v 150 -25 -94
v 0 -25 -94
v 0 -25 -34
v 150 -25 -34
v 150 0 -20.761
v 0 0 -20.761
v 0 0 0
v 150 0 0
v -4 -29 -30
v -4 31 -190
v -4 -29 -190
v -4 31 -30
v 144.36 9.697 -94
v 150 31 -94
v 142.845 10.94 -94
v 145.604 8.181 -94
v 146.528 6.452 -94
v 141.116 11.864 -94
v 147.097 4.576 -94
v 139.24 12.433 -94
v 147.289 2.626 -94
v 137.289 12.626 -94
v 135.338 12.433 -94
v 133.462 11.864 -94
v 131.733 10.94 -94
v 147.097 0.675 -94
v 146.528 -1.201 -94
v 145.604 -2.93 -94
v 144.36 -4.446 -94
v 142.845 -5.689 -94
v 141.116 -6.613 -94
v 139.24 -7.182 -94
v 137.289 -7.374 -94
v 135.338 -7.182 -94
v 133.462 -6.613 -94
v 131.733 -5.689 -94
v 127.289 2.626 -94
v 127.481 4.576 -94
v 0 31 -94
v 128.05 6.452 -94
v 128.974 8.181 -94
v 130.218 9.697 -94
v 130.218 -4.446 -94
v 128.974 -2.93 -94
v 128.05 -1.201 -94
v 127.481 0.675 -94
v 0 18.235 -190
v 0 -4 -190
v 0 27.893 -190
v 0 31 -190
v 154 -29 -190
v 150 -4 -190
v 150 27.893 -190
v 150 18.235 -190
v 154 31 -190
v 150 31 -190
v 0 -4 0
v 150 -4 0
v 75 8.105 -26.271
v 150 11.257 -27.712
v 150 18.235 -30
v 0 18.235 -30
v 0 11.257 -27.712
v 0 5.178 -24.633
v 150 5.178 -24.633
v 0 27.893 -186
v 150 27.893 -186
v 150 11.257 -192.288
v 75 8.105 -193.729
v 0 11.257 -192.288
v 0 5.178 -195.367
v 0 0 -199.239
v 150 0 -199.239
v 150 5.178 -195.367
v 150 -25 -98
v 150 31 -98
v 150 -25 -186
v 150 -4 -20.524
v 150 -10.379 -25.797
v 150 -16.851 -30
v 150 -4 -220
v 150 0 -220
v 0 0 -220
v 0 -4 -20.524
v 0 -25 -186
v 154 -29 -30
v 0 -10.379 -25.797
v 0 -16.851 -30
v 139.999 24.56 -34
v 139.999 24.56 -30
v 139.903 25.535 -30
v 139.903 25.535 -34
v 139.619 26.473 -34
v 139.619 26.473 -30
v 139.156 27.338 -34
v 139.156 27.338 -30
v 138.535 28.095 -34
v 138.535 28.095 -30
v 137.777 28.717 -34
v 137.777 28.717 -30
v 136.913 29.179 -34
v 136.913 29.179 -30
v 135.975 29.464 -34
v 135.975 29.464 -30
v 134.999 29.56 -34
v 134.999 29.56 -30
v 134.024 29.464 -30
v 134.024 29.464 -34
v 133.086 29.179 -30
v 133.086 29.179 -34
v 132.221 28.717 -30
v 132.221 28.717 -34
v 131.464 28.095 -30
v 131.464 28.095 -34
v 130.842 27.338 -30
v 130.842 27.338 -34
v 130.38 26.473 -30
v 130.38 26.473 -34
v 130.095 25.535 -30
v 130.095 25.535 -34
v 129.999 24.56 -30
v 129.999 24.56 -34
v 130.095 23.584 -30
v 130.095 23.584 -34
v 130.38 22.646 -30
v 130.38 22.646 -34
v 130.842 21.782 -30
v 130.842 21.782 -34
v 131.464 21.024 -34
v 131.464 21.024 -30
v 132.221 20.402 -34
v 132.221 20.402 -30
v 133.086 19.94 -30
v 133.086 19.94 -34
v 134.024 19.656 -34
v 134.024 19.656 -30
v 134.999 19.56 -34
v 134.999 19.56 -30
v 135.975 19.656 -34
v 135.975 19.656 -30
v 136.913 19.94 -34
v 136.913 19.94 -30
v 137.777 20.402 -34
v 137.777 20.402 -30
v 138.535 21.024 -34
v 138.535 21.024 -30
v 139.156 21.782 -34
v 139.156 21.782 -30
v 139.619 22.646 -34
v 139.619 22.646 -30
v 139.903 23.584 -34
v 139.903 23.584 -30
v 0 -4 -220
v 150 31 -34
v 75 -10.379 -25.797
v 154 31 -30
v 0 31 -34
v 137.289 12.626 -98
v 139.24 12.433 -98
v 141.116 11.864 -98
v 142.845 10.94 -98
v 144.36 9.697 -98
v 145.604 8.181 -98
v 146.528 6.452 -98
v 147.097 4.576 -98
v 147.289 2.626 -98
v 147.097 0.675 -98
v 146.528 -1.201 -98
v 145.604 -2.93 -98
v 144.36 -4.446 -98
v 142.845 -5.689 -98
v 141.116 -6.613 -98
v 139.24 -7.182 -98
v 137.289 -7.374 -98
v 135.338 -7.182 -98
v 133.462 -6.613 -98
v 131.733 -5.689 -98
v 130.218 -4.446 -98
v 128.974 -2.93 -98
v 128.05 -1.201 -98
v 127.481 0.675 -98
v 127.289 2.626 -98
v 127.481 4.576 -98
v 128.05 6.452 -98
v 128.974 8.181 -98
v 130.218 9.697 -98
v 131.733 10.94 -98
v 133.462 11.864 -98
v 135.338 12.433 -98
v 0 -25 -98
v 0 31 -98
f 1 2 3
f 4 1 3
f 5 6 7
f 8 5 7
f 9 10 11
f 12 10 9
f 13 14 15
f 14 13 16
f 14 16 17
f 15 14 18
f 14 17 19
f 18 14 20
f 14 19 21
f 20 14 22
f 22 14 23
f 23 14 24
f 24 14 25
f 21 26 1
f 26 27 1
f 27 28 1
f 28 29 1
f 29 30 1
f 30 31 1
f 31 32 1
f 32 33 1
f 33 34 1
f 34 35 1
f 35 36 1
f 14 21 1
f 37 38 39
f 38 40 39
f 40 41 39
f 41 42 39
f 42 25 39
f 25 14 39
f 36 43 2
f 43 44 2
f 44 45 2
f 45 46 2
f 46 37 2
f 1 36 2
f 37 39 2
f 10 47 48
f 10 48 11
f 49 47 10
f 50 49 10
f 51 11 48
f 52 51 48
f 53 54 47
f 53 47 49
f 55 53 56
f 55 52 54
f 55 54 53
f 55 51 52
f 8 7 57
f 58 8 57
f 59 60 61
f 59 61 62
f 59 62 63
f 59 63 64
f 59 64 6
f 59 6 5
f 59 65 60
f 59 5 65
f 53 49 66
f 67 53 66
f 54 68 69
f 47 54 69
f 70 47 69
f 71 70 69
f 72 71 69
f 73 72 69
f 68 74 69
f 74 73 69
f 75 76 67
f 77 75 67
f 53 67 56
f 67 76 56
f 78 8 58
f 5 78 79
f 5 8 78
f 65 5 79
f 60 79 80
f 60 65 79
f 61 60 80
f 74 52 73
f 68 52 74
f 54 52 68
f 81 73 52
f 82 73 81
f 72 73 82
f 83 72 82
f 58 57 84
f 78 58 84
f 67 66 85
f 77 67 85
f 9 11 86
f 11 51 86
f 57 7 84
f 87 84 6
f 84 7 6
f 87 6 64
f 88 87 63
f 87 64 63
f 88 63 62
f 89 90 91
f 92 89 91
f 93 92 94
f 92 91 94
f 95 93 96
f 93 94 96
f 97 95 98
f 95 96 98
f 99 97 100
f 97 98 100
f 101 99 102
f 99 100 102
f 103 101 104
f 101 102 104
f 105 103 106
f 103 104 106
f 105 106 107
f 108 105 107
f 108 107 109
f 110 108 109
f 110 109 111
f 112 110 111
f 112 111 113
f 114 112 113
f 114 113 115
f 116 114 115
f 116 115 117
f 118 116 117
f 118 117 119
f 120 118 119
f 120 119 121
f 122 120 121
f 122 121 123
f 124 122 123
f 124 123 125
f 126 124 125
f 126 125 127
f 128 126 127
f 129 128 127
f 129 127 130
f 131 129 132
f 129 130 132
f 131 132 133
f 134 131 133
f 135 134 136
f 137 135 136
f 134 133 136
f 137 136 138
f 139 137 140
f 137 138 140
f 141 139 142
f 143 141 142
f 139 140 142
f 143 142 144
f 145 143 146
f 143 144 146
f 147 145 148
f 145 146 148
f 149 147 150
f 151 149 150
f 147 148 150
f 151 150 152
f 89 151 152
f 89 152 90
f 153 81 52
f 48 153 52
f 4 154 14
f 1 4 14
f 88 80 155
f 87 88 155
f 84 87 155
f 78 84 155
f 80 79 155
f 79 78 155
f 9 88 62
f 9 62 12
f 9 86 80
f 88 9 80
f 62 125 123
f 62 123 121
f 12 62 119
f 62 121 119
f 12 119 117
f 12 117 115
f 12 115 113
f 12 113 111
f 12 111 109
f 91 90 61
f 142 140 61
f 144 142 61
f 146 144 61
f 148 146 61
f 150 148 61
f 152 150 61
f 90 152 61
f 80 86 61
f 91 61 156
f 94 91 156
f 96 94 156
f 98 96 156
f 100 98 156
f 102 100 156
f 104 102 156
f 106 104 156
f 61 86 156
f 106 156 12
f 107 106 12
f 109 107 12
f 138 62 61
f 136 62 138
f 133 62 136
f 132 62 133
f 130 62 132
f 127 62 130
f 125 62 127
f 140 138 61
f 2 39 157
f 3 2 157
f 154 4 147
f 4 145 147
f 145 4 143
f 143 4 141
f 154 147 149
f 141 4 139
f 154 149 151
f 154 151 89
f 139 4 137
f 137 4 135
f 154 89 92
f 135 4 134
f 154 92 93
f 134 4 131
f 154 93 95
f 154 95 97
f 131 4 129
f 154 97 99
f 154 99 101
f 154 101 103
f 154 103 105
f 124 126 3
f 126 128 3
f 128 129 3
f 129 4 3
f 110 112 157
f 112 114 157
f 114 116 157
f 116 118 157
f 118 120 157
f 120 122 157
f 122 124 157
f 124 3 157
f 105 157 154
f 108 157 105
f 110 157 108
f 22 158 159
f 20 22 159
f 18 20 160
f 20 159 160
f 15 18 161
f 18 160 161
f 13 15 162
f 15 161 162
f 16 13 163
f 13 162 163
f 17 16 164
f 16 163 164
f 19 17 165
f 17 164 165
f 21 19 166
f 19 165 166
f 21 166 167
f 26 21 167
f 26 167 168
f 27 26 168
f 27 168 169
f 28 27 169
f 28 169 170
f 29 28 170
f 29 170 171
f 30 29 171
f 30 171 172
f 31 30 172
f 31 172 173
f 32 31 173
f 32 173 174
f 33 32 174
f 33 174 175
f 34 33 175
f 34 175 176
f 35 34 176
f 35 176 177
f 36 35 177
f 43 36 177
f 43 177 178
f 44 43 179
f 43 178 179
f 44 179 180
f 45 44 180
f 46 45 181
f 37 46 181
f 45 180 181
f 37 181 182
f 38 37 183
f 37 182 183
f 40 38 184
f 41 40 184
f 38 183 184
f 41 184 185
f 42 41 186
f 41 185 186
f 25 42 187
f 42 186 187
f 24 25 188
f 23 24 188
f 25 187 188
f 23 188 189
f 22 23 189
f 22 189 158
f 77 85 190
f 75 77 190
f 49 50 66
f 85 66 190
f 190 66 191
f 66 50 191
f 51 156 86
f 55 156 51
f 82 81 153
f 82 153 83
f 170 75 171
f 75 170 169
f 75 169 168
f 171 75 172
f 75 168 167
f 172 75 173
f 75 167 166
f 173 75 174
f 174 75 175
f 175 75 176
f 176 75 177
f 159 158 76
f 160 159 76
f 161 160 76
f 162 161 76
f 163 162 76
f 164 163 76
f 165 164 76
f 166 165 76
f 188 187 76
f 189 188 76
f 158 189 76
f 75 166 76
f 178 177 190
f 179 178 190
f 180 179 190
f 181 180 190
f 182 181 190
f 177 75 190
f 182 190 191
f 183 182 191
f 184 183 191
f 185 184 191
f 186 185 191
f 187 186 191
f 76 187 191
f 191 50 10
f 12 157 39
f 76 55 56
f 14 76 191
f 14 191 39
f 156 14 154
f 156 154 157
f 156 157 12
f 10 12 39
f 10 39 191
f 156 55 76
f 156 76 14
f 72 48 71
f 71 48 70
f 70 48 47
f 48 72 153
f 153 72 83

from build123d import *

# Parameters (mm, degrees)
EXTRUDE_1_DEPTH     = 150
SKETCH_2_W          = 160
SKETCH_2_H          = 60
EXTRUDE_2_DEPTH     = 4
SKETCH_3_W          = 160
SKETCH_3_H          = 60
EXTRUDE_3_DEPTH     = 4
EXTRUDE_5_DEPTH     = 150
SKETCH_8_W          = 30
SKETCH_8_H          = 4
EXTRUDE_6_DEPTH     = 150
CUT_EXTRUDE_1_REACH = 272.328
SKETCH_10_R         = 10
CUT_EXTRUDE_2_DEPTH = 10
SKETCH_11_R         = 5
CUT_EXTRUDE_3_DEPTH = 10


with BuildPart() as part:
    # 草图1 → 凸台-拉伸1 (new body)
    with BuildSketch(Plane(origin=(0, 0, 0), x_dir=(0, 0, -1), z_dir=(1, 0, 0))):
        Polygon((30, 31), (30, 0), (0, 0), (0, -4), (30, -4), (30, -29), (190, -29), (190, 27.892594103), (186, 27.892594103), (186, -25), (98, -25), (98, 31), (94, 31), (94, -25), (34, -25), (34, 31), align=None)
    extrude(amount=EXTRUDE_1_DEPTH)

    # 草图2 → 凸台-拉伸2 (add)
    with BuildSketch(Plane(origin=(150, 0, 0), x_dir=(0, 0, -1), z_dir=(1, 0, 0))):
        with Locations((110, 1)):
            Rectangle(SKETCH_2_W, SKETCH_2_H)
    extrude(amount=EXTRUDE_2_DEPTH)

    # 草图3 → 凸台-拉伸3 (add)
    with BuildSketch(Plane.ZY):
        with Locations((-110, 1)):
            Rectangle(SKETCH_3_W, SKETCH_3_H)
    extrude(amount=EXTRUDE_3_DEPTH)

    # 草图5 → 凸台-拉伸5 (add)
    with BuildSketch(Plane(origin=(150, 0, -30), x_dir=(0, 0, 1), z_dir=(-1, 0, 0))):
        with BuildLine():
            add(Edge.make_bspline(
                [(0, 18.235042401), (2.837739177, 7.092842101), (9.238577647, 0)],
                knots=[0, 0, 0, 1, 1, 1], degree=2))
            Line((9.238577647, 0), (9.33878145, -0.092906558))
            Line((9.33878145, -0.092906558), (0, 0))
            Line((0, 0), (0, 18.235042401))
        make_face()
        with BuildLine():
            Line((0, -4), (0, -16.851035139))
            add(Edge.make_bspline(
                [(0, -16.851035139), (3.667477497, -10.331662623), (9.475645739, -4)],
                knots=[0, 0, 0, 1, 1, 1], degree=2))
            Line((9.475645739, -4), (0, -4))
        make_face()
    extrude_5 = extrude(amount=EXTRUDE_5_DEPTH)

    # 镜向2: 凸台-拉伸5 across plane
    add(extrude_5.mirror(Plane.XY.offset(-110)))

    # 草图8 → 凸台-拉伸6 (add)
    with BuildSketch(Plane(origin=(150, 0, 0), x_dir=(0, 0, -1), z_dir=(1, 0, 0))):
        with Locations((205, -2)):
            Rectangle(SKETCH_8_W, SKETCH_8_H)
    extrude(amount=-EXTRUDE_6_DEPTH)

    # 草图9 → 切除-拉伸1 (cut, up to next)
    with BuildSketch(Plane(origin=(150, 0, 0), x_dir=(0, 0, -1), z_dir=(1, 0, 0)), mode=Mode.PRIVATE) as cut_extrude_1_sk1:
        Polygon((199.475645739, -4), (190, -4), (190, -16.851035139), align=None)
    cut_extrude_1_tool1 = extrude(cut_extrude_1_sk1.sketch, amount=-CUT_EXTRUDE_1_REACH, mode=Mode.PRIVATE) & part.part
    add(cut_extrude_1_tool1.solids().sort_by_distance((150, -8.283678, -193.158549))[0], mode=Mode.SUBTRACT)

    # 草图10 → 切除-拉伸2 (cut)
    with BuildSketch(Plane(origin=(0, 0, -98), x_dir=(-1, 0, 0), z_dir=(0, 0, -1))):
        with Locations(Location((-137.288939056, 2.62555121, 0), (0, 0, 90))):
            Circle(SKETCH_10_R)
    extrude(amount=-CUT_EXTRUDE_2_DEPTH, mode=Mode.SUBTRACT)

    # 草图11 → 切除-拉伸3 (cut)
    with BuildSketch(Plane.XY.offset(-30)):
        with Locations((134.999120895, 24.559728505)):
            Circle(SKETCH_11_R)
    extrude(amount=-CUT_EXTRUDE_3_DEPTH, mode=Mode.SUBTRACT)


solid = part.part
